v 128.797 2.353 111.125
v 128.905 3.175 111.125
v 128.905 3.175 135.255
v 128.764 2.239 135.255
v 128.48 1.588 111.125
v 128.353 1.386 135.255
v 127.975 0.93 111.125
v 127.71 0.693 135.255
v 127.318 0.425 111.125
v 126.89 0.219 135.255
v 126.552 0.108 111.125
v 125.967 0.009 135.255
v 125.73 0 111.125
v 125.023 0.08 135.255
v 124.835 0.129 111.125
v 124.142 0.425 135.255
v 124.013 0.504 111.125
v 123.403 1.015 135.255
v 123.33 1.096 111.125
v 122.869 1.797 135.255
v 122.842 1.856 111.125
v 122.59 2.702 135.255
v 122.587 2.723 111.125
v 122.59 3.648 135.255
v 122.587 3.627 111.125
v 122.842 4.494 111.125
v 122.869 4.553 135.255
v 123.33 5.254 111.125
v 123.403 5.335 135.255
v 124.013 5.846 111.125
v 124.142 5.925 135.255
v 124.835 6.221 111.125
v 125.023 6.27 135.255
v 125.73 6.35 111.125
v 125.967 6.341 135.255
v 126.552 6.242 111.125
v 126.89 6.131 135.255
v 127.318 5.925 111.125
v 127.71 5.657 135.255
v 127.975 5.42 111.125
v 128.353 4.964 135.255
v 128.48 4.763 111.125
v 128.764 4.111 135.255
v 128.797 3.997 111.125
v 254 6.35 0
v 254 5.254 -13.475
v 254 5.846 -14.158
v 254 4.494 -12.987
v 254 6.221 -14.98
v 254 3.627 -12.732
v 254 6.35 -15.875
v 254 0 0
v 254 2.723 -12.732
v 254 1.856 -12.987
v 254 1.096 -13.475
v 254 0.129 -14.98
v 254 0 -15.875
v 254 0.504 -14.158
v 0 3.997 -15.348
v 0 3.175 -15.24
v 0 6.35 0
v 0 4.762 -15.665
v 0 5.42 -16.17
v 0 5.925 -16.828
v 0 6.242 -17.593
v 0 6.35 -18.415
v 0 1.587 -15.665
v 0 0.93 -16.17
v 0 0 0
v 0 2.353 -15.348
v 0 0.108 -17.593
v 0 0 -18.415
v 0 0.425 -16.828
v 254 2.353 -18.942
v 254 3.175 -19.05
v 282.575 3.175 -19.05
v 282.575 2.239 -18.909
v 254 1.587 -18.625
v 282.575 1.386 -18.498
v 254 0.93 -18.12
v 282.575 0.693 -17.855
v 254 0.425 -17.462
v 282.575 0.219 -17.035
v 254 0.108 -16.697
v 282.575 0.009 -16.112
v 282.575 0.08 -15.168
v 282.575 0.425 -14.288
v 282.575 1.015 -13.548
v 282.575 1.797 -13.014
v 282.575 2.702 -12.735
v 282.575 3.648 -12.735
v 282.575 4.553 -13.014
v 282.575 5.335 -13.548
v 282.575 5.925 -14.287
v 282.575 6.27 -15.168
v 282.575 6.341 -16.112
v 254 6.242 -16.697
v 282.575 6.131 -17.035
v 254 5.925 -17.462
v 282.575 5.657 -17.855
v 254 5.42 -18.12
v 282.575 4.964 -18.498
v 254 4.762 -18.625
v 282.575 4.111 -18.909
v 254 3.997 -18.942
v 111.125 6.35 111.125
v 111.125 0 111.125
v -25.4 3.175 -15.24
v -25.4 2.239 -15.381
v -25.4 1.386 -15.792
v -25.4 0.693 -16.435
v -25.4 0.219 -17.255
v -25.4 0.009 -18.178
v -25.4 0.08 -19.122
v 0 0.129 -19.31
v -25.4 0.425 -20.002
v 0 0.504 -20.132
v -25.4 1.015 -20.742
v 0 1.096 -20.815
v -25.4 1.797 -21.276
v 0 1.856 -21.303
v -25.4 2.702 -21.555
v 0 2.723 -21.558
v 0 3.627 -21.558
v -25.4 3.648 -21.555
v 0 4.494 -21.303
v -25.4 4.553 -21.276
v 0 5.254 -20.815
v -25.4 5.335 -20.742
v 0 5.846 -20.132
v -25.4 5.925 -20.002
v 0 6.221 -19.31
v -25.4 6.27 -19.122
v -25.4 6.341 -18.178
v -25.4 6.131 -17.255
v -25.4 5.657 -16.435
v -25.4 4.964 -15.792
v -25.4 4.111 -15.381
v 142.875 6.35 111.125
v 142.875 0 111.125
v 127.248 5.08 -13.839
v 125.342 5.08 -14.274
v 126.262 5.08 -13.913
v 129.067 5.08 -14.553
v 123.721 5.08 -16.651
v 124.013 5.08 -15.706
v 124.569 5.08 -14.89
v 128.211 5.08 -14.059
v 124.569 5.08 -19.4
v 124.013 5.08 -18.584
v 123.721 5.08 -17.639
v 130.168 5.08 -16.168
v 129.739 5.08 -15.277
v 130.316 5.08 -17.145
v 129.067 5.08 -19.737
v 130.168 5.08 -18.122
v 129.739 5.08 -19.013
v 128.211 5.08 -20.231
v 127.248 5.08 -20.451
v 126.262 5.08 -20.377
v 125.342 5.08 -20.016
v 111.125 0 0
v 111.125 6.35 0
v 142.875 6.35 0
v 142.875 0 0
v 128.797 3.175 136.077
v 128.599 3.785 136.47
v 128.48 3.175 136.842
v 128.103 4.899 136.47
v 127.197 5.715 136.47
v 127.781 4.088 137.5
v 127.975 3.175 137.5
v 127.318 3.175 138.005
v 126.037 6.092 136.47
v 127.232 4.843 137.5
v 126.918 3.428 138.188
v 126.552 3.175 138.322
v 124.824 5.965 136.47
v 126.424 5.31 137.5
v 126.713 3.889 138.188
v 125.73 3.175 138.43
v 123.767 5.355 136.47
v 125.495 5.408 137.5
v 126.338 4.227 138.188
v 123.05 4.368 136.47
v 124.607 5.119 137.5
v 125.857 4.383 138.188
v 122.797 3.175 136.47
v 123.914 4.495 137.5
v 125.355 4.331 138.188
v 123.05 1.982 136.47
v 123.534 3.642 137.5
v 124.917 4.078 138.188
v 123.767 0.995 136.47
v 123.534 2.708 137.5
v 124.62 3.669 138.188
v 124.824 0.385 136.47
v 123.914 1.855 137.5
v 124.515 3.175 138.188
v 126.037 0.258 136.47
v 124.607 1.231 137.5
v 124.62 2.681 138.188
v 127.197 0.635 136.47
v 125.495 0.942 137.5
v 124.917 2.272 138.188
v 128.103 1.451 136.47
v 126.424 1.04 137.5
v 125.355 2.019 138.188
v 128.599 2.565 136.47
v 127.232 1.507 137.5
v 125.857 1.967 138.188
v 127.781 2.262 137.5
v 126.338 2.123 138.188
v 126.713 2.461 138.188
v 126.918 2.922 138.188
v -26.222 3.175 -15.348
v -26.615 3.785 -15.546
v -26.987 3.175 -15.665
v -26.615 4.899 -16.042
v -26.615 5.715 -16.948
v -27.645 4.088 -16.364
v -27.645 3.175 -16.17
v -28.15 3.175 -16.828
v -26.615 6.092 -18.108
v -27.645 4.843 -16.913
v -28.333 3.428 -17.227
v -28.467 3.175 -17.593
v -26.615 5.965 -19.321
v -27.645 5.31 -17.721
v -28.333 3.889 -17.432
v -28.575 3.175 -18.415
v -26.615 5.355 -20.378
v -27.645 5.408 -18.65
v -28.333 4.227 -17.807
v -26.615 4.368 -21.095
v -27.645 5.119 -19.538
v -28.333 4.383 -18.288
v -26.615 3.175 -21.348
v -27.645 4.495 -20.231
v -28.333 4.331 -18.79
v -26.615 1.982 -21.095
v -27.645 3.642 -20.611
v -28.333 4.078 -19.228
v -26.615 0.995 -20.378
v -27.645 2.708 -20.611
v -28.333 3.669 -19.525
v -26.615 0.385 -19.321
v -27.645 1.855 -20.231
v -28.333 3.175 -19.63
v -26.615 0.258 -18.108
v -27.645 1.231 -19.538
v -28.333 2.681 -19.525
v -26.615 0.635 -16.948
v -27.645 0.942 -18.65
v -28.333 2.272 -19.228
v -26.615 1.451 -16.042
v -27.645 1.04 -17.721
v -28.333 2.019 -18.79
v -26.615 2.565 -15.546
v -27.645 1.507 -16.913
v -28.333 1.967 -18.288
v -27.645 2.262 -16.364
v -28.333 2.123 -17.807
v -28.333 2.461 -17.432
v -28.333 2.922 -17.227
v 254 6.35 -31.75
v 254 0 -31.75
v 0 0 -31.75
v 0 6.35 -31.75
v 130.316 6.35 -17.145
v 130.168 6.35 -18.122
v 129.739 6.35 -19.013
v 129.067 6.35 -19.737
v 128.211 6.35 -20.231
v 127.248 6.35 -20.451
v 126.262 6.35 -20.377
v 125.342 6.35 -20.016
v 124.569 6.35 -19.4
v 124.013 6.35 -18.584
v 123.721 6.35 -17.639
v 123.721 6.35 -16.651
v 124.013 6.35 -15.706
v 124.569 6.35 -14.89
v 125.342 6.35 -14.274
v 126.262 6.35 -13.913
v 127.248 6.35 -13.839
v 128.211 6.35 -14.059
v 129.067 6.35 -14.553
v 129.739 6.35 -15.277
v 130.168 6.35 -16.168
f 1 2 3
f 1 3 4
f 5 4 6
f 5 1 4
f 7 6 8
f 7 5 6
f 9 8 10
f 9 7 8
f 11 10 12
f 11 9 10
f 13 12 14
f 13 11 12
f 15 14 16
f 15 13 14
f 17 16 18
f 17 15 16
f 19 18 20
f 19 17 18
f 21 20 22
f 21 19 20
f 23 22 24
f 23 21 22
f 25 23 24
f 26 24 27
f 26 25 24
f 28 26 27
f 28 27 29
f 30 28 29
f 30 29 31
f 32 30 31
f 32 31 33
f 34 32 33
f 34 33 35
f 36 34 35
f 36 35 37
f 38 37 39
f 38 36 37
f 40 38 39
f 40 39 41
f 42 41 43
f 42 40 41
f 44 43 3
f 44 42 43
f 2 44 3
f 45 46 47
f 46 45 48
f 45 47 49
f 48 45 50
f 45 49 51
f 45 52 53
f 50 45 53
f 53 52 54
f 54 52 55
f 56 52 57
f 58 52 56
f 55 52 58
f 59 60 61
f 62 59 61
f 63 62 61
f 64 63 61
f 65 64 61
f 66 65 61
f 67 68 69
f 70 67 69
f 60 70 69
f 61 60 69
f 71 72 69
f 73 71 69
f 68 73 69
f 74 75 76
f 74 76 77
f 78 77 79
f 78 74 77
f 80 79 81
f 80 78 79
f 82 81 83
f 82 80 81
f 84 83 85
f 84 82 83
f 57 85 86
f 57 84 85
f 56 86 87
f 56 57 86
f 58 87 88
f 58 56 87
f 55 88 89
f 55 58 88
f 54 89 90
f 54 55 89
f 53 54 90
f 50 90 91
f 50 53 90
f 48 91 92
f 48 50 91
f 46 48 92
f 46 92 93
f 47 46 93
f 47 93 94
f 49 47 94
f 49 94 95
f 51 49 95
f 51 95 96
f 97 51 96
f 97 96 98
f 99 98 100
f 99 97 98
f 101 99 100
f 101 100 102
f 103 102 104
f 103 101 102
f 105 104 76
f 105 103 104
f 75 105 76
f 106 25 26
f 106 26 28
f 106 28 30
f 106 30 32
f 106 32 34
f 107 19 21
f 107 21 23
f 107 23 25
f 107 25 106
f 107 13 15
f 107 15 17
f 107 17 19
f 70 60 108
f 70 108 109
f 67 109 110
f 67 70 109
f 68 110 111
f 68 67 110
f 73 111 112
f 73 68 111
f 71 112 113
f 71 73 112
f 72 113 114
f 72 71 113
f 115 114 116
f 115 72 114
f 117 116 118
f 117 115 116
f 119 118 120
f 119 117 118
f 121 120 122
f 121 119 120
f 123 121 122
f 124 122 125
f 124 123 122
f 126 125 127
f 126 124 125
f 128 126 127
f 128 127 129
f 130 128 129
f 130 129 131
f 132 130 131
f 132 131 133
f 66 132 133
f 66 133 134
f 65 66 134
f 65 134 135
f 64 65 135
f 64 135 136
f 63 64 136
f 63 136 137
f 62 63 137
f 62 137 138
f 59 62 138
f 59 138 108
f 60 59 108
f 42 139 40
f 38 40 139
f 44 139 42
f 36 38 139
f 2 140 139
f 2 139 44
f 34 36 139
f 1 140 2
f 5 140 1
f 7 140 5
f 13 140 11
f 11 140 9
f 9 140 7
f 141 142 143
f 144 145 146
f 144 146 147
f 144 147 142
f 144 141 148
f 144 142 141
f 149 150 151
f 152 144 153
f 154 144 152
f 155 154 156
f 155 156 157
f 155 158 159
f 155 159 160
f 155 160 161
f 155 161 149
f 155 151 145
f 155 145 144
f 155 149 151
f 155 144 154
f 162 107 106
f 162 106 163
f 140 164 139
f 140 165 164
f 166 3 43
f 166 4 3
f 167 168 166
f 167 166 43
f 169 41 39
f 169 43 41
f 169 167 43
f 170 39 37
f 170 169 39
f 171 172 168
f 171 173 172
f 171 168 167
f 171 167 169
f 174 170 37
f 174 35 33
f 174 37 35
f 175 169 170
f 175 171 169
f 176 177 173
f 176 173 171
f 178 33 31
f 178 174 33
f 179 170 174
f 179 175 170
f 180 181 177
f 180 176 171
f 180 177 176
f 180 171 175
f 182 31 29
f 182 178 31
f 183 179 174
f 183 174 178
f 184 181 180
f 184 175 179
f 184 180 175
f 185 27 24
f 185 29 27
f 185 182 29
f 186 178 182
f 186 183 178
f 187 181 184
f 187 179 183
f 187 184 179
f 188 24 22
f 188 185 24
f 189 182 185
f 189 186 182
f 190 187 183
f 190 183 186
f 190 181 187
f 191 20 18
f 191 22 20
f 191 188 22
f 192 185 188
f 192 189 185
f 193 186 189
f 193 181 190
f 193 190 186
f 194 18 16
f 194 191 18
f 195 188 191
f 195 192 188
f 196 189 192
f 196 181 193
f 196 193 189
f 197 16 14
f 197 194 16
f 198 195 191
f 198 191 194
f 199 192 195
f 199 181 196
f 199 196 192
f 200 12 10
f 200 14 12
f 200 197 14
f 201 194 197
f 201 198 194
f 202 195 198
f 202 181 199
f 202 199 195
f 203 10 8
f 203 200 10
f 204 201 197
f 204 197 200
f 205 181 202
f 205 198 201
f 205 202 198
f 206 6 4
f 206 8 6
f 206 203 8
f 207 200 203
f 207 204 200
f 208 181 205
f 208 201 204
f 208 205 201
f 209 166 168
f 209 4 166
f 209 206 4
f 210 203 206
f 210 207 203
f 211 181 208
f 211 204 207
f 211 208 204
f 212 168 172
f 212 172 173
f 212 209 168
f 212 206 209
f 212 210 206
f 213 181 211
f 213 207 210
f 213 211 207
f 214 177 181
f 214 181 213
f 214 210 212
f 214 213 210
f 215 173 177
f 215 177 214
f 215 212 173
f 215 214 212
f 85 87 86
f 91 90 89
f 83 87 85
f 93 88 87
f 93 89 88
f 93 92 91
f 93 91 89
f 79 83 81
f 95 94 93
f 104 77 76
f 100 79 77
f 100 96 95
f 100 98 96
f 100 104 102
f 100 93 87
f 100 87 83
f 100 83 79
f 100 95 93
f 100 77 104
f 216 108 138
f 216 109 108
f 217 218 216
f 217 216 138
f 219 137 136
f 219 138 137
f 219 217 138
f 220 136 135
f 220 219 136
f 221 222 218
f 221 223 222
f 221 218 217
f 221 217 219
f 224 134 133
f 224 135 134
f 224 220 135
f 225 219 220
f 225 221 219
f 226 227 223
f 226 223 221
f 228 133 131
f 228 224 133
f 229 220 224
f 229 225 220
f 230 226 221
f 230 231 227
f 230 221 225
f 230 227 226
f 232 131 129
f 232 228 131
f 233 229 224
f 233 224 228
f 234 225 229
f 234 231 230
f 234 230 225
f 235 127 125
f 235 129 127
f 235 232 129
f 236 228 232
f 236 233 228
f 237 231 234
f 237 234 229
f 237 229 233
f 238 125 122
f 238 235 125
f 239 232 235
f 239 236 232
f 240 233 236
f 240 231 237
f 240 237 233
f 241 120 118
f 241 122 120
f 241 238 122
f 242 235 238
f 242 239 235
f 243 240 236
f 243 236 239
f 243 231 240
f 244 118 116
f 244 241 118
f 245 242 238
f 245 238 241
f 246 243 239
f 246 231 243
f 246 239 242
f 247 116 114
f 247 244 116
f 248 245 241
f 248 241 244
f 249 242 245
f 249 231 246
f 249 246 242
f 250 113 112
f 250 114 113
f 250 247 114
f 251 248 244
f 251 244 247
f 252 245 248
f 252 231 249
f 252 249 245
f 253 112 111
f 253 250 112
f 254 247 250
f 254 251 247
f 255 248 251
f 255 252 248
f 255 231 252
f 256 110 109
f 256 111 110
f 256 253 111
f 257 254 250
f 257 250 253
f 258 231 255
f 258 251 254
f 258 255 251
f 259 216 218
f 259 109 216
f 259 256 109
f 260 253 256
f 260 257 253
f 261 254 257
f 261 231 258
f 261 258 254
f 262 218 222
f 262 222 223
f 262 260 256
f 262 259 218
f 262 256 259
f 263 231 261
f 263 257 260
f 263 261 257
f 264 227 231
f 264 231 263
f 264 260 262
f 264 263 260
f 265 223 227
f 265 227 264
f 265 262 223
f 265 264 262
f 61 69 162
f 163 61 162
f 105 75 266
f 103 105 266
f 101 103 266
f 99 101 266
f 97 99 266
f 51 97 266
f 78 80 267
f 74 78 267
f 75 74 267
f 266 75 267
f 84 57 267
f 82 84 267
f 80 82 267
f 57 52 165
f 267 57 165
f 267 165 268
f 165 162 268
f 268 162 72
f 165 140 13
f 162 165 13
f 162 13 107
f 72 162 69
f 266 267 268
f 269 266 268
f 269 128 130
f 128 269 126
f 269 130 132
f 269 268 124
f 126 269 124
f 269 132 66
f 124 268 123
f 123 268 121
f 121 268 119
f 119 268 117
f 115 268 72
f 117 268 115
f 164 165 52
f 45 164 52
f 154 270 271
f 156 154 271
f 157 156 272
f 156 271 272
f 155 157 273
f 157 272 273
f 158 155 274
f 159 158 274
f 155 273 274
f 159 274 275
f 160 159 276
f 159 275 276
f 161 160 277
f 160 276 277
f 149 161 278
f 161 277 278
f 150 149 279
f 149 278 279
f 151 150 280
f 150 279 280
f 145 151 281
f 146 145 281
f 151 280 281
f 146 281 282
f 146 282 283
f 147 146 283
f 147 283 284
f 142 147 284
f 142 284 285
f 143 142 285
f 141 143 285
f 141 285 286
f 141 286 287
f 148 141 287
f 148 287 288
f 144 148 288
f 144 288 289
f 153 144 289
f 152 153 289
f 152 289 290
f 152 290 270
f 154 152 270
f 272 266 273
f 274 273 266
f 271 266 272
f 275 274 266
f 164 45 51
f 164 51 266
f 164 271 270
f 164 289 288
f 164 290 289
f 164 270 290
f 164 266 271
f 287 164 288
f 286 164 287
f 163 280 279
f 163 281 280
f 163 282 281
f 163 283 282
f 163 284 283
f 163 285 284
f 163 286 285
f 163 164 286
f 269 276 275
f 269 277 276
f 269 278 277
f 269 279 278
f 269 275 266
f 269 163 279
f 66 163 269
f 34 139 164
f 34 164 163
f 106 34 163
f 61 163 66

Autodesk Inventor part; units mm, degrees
ref_plane "YZ Plane" through (0, 0, 0) normal (1, 0, 0) x (0, 1, 0)
ref_plane "XZ Plane" through (0, 0, 0) normal (0, 1, 0) x (-1, 0, 0)
ref_plane "XY Plane" through (0, 0, 0) normal (0, 0, 1) x (1, 0, 0)
sketch "Sketch1" plane through (0, 0, 0) normal (0, 1, 0) x (-1, 0, 0)
  line L0 (-254, 0) -> (-254, -31.75)
  line L1 (-254, -31.75) -> (0, -31.75)
  line L2 (0, -31.75) -> (0, 0)
  line L3 (-111.125, -15.875) -> (-142.875, -15.875)
  line L4 (-142.875, 0) -> (-142.875, 111.125)
  line L5 (-142.875, 111.125) -> (-111.125, 111.125)
  line L6 (-111.125, 111.125) -> (-111.125, 0)
  line L7 (0, 0) -> (-111.125, 0)
  line L8 (-142.875, 0) -> (-254, 0)
  point P0 (-127, -15.875)
  dimension "d0" = 254
  dimension "d1" = 31.75
  dimension "d5" = 15.875
  dimension "d6" = 127
  dimension "d7" = 15.875
  dimension "d8" = 127
extrude "Extrusion1" add sketch "Sketch1" along normal blind 6.35
sketch "Sketch3" plane through (0, 6.35, 0) normal (0, 1, 0) x (1, 0, 0)
  line L0 (0, 0) -> (111.125, 0) projected
  line L1 (0, 31.75) -> (0, 0) projected
  circle A0 centre (127, 17.145) radius 3.3156
  dimension "d13" = 17.145
  dimension "d14" = 127
extrude "Extrusion3" cut sketch "Sketch3" against normal blind 1.27
sketch "Sketch4" plane through (254, 0, 0) normal (1, 0, 0) x (0, 0, -1)
  line L0 (31.75, 0) -> (0, 0) projected
  line L1 (31.75, 0) -> (31.75, 6.35) projected
  circle A0 centre (15.875, 3.175) radius 3.175
  dimension "d21" = 15.875
  dimension "d22" = 3.175
extrude "Extrusion4" add sketch "Sketch4" along normal blind 28.575
pattern_circular "Circular Pattern2" count 3 over 180 about axis through (127, 6.35, -17.145) along (0, -1, 0) of "Extrusion4"
fillet "Fillet1" radius 3.175 1 edges at (122.555, 3.175, 138.43)
fillet "Fillet2" radius 3.175 1 edges at (-28.575, 3.175, -21.59)
properties part number "Motor_Mount"
